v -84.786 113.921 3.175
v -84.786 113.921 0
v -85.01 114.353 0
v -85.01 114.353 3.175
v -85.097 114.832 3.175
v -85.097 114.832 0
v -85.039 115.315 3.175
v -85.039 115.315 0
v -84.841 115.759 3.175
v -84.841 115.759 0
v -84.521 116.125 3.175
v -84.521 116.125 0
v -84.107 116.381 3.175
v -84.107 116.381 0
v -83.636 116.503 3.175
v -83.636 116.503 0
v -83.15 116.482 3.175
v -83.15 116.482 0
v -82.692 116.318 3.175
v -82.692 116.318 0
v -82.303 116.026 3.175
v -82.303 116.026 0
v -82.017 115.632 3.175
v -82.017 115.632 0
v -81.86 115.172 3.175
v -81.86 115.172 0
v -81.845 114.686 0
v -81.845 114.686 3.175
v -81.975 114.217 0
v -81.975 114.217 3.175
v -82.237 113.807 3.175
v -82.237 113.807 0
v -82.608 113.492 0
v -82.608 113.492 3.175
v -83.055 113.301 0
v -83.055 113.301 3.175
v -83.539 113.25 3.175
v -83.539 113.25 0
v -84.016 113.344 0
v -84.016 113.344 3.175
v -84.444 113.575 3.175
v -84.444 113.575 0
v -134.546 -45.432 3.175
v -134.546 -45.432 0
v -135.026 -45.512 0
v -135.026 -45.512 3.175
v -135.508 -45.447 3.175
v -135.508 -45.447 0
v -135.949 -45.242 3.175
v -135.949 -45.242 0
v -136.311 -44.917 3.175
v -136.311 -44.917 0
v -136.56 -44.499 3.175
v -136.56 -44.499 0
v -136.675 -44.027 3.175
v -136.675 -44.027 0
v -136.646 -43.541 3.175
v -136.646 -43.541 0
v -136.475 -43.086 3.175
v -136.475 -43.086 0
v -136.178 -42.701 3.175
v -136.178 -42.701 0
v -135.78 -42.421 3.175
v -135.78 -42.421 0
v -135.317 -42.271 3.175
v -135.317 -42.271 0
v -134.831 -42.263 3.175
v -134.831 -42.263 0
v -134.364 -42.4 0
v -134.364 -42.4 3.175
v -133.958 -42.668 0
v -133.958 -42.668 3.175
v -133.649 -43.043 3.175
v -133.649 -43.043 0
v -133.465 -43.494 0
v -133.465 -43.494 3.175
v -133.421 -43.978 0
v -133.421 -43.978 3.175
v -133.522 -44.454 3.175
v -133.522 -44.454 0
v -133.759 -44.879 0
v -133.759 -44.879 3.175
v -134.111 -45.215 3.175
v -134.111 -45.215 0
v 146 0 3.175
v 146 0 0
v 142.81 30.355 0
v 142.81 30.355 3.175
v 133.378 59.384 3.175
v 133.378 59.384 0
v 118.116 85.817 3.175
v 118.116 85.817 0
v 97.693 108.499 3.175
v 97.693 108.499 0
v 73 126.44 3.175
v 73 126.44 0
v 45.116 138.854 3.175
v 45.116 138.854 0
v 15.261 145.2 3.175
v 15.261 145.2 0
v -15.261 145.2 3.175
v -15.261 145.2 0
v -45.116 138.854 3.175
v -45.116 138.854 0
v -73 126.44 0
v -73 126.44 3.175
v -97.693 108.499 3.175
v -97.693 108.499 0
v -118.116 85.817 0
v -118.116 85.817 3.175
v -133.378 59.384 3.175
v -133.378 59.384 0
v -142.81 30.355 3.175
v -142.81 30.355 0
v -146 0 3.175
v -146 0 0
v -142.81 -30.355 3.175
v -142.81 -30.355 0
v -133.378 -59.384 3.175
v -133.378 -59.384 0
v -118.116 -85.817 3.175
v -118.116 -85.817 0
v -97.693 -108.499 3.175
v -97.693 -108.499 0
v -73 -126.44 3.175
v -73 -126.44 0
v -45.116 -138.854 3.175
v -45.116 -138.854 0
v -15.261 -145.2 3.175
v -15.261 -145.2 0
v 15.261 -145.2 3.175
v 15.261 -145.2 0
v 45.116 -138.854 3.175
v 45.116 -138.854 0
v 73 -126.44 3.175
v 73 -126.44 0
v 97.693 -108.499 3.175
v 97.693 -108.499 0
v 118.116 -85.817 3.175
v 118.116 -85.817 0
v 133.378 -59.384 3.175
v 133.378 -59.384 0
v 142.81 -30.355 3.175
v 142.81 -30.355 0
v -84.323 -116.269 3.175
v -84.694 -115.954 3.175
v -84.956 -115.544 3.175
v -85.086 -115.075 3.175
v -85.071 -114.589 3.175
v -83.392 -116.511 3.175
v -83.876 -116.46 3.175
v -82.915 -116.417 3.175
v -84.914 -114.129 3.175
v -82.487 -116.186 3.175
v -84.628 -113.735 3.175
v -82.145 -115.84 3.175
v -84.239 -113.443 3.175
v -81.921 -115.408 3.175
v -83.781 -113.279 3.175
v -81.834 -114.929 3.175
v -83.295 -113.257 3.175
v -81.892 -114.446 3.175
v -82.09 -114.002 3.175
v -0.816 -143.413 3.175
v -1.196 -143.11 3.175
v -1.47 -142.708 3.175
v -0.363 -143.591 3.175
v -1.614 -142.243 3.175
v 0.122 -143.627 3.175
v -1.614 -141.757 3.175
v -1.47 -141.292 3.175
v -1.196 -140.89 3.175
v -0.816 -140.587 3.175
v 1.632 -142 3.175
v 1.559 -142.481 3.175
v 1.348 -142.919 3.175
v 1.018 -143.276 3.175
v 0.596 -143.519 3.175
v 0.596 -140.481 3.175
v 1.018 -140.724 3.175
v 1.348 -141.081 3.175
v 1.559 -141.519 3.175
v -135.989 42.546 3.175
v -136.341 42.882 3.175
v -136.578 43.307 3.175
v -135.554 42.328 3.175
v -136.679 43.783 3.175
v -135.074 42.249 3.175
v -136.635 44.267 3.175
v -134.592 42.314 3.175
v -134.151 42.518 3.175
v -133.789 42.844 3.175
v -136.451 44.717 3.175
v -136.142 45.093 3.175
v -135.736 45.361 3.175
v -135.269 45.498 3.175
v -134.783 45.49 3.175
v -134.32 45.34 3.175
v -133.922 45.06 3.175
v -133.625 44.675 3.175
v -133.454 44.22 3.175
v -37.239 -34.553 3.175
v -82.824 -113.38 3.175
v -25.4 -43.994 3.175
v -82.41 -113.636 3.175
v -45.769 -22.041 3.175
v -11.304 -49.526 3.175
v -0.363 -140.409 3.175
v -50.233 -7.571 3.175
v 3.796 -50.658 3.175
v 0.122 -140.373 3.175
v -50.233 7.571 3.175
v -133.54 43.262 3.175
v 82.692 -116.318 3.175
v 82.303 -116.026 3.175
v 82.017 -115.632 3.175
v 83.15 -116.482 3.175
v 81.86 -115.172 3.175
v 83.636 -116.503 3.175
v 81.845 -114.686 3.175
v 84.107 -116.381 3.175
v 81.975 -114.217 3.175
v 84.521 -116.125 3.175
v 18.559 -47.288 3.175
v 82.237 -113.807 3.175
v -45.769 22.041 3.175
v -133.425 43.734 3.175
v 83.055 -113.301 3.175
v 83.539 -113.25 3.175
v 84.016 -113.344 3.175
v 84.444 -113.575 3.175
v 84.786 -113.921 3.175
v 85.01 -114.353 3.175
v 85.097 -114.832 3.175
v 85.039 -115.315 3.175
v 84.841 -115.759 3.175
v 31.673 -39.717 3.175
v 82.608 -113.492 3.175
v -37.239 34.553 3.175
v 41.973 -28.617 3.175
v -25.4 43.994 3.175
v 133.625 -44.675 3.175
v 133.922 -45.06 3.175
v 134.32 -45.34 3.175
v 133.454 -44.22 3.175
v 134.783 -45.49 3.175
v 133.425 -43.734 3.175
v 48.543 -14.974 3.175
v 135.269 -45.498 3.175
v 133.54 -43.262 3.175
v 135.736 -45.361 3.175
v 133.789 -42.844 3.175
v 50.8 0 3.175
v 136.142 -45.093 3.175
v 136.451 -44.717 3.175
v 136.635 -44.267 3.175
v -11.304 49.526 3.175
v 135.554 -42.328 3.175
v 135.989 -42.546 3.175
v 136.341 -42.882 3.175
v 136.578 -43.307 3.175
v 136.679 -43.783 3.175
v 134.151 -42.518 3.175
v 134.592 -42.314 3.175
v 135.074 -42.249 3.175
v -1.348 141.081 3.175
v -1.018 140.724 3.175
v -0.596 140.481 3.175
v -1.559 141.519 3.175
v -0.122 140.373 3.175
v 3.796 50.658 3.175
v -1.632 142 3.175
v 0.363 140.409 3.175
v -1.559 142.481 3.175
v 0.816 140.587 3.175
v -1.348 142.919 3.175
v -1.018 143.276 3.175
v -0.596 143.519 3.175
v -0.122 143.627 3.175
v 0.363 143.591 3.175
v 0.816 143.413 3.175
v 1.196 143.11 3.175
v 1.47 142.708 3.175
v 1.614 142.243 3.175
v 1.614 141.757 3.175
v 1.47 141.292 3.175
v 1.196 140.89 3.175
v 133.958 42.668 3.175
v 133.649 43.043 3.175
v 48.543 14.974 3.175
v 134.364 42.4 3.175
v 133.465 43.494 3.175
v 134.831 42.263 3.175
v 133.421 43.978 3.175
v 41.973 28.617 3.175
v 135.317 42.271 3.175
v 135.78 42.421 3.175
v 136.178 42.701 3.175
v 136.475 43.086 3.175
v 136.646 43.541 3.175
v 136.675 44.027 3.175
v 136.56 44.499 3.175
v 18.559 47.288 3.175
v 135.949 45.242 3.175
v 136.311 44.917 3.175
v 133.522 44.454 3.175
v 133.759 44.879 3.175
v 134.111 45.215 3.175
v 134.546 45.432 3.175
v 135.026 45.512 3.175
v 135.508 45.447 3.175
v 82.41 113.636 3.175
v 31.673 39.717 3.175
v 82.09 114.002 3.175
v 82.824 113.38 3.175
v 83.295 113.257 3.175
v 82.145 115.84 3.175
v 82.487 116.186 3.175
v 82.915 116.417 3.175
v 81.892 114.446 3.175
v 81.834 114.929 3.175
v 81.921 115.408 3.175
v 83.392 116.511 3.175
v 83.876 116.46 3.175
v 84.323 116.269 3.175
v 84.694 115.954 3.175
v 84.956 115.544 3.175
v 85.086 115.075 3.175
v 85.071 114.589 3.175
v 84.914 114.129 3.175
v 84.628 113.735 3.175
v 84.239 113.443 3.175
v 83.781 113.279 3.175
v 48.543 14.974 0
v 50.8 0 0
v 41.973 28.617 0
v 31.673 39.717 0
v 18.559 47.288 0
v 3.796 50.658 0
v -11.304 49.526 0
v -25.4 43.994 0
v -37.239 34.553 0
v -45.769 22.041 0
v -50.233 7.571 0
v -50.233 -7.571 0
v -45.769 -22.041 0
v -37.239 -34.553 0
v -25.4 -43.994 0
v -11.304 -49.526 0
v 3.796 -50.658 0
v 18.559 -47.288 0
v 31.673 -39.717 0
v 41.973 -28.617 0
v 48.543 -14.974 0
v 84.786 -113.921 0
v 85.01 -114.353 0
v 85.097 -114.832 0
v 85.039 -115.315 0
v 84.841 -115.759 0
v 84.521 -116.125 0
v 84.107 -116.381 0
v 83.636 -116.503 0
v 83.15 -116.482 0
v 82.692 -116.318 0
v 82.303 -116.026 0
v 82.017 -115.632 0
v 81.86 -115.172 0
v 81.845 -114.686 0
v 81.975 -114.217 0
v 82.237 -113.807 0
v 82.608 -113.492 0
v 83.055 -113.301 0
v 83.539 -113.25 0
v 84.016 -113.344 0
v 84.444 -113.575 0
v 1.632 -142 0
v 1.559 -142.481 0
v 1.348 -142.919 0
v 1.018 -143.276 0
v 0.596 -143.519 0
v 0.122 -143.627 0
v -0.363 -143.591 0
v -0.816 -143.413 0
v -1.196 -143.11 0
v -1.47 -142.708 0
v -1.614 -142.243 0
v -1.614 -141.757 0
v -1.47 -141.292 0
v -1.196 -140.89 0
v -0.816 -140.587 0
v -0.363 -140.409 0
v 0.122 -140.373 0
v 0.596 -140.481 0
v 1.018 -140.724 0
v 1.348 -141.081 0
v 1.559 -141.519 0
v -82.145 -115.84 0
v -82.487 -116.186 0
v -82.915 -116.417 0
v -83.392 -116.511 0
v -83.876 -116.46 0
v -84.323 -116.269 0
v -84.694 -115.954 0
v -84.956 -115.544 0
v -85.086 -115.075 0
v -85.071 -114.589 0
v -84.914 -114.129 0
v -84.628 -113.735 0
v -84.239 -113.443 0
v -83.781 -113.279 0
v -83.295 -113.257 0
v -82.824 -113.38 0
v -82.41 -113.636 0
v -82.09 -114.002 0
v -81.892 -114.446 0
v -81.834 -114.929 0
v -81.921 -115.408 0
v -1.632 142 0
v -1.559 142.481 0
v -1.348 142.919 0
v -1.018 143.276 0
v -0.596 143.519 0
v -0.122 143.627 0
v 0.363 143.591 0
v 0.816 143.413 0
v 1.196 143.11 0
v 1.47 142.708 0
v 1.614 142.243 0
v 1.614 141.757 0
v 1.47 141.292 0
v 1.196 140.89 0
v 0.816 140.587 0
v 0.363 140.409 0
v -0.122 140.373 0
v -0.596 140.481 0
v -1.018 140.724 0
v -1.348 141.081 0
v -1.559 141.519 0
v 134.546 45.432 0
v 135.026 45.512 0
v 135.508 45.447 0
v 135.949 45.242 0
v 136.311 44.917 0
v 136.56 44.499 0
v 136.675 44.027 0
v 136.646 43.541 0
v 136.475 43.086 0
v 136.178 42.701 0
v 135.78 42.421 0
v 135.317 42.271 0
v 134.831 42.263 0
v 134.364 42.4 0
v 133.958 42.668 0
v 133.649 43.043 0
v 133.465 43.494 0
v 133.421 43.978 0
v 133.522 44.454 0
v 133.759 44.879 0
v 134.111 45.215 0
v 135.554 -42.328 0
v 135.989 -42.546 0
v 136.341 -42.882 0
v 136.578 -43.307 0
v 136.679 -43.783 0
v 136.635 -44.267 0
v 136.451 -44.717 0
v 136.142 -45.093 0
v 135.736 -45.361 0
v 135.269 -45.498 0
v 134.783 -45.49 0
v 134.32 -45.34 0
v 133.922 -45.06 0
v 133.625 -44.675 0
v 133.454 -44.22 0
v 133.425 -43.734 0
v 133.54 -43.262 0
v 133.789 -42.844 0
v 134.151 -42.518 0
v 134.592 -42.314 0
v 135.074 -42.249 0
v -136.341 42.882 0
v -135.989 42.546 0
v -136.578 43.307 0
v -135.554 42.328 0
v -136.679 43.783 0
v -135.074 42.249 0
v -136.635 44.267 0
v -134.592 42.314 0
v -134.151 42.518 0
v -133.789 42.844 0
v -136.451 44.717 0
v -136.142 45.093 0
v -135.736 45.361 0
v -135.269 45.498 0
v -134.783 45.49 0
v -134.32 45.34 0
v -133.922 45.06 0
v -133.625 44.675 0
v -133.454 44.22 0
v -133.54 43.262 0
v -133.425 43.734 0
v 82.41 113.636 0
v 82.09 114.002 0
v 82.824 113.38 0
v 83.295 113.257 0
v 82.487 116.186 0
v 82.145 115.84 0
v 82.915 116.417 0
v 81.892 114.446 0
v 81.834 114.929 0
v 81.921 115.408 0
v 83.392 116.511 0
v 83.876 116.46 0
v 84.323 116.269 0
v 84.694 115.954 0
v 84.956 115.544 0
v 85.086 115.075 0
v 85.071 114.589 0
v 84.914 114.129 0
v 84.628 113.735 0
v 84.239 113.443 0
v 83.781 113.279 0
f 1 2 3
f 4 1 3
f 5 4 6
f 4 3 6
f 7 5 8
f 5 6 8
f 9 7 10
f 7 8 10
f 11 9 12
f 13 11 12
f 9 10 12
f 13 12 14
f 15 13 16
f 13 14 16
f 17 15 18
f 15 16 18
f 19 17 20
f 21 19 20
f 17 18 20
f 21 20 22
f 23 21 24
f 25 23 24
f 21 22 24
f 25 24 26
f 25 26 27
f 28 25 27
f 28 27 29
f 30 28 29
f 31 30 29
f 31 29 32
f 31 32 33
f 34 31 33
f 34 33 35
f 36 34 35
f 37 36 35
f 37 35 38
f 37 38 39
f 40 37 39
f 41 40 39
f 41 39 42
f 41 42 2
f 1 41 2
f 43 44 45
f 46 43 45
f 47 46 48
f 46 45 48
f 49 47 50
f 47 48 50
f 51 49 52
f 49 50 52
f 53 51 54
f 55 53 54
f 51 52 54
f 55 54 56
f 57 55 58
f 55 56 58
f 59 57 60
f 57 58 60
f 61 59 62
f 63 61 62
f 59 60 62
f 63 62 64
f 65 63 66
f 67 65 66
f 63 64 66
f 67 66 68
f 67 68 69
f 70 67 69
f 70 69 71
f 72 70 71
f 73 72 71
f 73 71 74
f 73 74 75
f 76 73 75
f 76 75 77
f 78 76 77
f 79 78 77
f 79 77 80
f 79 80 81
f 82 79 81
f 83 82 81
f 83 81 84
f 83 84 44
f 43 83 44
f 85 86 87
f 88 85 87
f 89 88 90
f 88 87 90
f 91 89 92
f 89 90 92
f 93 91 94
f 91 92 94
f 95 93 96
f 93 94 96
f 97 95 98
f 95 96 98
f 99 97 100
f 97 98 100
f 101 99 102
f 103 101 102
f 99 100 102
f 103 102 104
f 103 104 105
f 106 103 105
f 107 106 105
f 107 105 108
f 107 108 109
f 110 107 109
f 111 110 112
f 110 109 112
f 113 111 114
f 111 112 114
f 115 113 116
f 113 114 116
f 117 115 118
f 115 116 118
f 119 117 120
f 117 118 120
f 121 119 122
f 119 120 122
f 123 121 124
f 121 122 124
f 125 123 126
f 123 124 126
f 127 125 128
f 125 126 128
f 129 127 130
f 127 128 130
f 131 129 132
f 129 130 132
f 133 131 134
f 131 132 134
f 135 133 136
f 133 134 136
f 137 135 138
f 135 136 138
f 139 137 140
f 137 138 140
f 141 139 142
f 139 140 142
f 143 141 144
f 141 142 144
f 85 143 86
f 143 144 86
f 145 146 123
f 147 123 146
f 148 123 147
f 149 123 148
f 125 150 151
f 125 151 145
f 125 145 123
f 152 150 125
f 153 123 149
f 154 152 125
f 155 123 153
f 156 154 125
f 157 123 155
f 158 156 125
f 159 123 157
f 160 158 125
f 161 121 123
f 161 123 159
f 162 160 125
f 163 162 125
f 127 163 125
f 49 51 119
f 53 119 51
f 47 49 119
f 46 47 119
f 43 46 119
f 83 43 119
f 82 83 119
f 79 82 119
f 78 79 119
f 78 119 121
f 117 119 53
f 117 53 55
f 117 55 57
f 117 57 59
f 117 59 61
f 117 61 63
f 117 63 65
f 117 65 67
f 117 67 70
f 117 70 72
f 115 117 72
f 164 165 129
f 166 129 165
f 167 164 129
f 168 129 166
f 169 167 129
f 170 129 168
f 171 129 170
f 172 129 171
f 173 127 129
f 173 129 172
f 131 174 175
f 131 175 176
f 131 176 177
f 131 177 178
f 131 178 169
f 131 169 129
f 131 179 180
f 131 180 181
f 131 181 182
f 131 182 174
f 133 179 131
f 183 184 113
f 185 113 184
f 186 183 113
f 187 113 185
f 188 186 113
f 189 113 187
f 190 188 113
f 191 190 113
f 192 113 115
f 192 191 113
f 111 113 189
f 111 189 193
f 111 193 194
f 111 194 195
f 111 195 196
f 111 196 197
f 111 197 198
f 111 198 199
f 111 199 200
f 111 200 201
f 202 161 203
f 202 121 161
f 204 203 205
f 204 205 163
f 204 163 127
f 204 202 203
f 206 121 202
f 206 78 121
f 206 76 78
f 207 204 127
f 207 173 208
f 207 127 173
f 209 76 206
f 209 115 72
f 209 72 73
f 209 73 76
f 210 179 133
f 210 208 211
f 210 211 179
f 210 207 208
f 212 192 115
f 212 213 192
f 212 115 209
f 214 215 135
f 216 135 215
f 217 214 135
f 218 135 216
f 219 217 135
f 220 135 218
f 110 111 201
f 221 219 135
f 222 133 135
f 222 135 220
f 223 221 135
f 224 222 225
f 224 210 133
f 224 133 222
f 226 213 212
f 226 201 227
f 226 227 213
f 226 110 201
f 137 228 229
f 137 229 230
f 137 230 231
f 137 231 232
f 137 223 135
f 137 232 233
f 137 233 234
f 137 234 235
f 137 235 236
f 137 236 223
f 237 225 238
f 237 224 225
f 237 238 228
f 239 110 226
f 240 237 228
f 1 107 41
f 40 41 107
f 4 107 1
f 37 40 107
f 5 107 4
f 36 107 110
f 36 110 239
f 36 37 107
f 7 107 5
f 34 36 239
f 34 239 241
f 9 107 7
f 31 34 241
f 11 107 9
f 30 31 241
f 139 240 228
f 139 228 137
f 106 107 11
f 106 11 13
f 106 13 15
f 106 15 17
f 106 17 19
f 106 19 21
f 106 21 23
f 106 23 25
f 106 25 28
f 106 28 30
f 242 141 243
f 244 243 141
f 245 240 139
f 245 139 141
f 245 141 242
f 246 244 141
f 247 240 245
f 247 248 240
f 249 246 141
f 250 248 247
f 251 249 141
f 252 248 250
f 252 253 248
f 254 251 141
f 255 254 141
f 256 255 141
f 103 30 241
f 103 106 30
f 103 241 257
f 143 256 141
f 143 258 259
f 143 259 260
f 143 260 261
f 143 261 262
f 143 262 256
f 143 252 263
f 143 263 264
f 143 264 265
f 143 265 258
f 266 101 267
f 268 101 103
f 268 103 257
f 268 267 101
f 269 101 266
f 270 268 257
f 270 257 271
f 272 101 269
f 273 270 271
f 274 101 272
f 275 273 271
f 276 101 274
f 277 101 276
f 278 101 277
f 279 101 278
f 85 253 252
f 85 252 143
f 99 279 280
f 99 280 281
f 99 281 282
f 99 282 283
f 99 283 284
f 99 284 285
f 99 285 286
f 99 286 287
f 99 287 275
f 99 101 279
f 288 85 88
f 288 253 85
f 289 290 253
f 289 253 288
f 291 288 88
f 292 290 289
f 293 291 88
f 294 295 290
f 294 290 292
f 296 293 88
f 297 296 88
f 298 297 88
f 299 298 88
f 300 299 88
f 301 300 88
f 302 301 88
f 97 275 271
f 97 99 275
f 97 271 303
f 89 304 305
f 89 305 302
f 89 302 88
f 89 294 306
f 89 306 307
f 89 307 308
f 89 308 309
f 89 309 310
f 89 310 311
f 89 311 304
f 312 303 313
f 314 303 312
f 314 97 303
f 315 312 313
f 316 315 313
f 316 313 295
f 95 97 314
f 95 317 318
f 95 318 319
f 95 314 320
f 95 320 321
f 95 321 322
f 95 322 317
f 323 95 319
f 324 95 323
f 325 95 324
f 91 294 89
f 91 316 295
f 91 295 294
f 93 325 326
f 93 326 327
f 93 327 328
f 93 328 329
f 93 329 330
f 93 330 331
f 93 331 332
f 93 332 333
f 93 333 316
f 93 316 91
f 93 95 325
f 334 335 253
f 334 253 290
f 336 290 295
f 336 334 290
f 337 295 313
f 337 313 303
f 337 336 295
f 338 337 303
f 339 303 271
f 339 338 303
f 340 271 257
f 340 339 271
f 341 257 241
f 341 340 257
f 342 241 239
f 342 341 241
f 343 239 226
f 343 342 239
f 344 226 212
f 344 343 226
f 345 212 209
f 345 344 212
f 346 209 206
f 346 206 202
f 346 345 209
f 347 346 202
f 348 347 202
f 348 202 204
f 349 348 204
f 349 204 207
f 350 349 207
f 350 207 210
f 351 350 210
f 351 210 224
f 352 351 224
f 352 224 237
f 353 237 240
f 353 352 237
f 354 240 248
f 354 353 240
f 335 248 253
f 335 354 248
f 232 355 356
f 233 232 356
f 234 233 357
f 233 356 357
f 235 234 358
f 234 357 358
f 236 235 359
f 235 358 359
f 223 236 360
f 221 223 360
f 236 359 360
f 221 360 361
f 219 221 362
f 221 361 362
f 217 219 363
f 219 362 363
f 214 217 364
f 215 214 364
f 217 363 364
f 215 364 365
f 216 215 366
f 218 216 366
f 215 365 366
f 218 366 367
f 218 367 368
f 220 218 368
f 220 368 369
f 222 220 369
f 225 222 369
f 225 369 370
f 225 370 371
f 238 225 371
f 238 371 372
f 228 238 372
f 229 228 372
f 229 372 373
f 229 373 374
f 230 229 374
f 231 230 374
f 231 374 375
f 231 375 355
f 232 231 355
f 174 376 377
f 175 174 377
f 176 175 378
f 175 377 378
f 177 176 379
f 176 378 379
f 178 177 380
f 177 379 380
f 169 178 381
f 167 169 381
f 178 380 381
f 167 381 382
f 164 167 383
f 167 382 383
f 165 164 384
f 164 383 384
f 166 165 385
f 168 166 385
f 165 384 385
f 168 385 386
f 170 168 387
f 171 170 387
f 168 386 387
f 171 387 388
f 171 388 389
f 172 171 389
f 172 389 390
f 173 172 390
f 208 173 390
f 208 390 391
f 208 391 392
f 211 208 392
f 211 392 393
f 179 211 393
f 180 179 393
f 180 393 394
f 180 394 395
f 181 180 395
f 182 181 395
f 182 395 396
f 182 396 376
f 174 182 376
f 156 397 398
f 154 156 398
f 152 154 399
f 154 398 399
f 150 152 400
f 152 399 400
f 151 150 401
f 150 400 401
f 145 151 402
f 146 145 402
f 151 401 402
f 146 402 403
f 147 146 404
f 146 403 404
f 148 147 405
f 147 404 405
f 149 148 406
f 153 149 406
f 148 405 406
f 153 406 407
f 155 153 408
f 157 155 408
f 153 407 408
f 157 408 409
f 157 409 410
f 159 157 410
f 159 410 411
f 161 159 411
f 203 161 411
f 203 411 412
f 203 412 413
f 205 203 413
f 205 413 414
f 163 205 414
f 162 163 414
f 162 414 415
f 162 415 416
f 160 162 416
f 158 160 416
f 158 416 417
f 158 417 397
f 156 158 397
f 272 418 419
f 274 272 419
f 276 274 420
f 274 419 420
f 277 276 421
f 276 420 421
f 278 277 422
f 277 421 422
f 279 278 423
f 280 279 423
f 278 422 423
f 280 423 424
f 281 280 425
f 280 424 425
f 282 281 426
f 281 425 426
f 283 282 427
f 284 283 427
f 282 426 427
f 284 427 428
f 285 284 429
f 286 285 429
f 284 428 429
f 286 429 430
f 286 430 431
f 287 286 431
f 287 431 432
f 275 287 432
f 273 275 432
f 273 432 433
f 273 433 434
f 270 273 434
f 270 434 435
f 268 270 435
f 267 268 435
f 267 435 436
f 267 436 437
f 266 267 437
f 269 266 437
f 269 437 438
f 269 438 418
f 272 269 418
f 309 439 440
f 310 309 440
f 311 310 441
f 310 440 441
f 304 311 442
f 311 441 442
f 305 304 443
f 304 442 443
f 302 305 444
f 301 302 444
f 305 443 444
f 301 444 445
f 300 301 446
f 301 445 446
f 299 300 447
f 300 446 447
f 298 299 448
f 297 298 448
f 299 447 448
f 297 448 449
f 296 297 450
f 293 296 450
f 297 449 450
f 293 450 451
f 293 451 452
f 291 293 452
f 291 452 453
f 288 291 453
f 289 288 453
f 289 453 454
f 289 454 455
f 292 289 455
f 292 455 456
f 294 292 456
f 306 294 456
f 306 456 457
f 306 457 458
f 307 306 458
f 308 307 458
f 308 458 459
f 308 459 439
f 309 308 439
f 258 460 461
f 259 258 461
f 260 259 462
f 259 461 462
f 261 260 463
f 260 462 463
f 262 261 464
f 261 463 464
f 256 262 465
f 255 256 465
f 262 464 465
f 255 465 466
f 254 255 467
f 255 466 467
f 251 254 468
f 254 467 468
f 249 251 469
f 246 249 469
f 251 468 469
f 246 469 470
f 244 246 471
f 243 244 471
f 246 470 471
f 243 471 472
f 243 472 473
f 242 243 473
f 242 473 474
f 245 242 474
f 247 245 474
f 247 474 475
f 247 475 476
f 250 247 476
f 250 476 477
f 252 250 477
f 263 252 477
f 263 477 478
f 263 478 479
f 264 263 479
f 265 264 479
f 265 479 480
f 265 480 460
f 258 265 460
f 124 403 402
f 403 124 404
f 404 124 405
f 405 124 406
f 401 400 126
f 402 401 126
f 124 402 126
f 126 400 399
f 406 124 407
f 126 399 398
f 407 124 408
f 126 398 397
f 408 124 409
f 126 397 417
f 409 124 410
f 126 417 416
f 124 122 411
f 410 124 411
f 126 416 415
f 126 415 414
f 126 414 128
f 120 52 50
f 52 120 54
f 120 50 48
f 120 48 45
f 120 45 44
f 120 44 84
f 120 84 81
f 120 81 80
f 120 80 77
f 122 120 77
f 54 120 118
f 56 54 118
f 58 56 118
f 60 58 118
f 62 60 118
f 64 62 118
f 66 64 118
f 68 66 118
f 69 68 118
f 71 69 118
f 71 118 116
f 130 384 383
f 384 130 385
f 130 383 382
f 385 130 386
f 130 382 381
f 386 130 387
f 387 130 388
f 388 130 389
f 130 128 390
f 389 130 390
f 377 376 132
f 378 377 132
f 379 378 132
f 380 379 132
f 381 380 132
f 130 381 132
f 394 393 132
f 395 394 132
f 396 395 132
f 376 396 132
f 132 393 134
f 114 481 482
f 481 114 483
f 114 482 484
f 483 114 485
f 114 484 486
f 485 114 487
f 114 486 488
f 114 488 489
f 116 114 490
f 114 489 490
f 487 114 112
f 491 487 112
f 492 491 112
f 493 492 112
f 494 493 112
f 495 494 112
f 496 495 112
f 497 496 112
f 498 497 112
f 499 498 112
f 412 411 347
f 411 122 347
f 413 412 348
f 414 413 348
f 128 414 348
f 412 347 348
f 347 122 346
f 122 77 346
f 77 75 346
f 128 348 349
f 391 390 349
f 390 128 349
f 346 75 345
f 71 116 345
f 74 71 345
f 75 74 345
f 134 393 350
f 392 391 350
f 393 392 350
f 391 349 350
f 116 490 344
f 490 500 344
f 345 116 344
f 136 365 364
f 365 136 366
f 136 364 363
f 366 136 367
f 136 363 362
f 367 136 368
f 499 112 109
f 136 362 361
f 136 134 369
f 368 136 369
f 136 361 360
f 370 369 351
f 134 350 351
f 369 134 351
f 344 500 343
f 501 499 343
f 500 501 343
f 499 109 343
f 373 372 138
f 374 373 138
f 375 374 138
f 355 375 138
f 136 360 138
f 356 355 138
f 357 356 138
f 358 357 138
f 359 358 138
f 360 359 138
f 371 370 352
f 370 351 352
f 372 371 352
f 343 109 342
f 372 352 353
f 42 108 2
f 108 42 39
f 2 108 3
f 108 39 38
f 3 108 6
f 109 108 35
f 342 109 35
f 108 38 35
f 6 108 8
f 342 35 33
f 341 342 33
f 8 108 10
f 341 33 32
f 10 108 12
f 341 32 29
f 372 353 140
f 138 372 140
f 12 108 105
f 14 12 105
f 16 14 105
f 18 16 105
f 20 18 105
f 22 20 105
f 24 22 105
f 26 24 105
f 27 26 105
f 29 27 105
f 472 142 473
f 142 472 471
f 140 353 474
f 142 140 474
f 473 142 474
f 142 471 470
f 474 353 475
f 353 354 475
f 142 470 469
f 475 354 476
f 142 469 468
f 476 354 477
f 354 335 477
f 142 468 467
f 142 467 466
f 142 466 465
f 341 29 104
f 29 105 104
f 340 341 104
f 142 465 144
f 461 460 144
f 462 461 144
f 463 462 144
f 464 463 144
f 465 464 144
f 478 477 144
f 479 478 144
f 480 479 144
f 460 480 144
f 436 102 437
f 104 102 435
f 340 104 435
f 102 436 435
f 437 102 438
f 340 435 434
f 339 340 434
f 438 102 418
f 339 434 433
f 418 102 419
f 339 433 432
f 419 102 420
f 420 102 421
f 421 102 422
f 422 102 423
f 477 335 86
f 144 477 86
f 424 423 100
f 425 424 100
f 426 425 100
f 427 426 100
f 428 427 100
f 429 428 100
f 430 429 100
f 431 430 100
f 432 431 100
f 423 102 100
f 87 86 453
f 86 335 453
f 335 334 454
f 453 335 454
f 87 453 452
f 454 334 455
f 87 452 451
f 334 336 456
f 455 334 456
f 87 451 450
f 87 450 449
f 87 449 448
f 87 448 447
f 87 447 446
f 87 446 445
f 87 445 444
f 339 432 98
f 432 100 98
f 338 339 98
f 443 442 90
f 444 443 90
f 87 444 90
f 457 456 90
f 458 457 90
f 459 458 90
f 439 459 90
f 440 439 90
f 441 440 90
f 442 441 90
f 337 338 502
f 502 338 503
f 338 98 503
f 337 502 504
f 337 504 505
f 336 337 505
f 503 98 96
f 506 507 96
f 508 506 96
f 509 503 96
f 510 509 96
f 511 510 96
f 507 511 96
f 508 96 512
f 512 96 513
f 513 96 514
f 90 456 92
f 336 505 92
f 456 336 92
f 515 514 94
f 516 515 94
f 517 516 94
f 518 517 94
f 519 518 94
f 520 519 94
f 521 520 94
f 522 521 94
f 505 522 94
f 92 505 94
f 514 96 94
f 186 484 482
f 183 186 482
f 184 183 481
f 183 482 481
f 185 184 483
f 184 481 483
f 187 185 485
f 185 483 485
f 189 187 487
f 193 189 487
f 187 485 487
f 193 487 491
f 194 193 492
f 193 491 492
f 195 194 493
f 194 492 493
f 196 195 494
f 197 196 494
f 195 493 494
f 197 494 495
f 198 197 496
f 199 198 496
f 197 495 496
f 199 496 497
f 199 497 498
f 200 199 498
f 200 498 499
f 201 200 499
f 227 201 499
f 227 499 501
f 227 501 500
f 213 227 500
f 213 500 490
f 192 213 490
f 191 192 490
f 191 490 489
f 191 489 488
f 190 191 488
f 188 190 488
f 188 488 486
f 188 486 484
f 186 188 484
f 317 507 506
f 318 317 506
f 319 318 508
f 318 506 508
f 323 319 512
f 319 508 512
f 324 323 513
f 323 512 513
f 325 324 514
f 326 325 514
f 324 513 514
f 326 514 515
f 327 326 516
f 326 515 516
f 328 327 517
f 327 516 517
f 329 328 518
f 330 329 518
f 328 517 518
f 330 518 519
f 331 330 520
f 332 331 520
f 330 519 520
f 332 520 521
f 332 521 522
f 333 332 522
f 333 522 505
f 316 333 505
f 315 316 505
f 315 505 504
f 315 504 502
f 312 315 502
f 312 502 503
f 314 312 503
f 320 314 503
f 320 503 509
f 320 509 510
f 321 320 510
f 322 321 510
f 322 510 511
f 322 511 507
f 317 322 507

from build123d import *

# Parameters (mm, degrees)
SKETCH1_R             = 146
SKETCH1_R_2           = 50.8
BOSS_EXTRUDE1_DEPTH   = 3.175
F_4_CLEARANCE_HOLE1_D = 3.2639
CIRPATTERN1_COUNT     = 10


with BuildPart() as part:
    # Sketch1 → Boss-Extrude1 (new body)
    with BuildSketch(Plane.XY):
        Circle(SKETCH1_R)
        Circle(SKETCH1_R_2, mode=Mode.SUBTRACT)
    extrude(amount=BOSS_EXTRUDE1_DEPTH)

    # #4 Clearance Hole1 (through all)
    with Locations(Plane.XY.offset(3.175)):
        with Locations((0, 142)):
            f_4_clearance_hole1 = Hole(F_4_CLEARANCE_HOLE1_D / 2)

    # CirPattern1: #4 Clearance Hole1 ×10 about axis
    cirpattern1_axis = Axis((0, 0, 0), (0, 0, 1))
    for i in range(1, CIRPATTERN1_COUNT):
        add(f_4_clearance_hole1.rotate(cirpattern1_axis, i * 360 / CIRPATTERN1_COUNT), mode=Mode.SUBTRACT)


solid = part.part
